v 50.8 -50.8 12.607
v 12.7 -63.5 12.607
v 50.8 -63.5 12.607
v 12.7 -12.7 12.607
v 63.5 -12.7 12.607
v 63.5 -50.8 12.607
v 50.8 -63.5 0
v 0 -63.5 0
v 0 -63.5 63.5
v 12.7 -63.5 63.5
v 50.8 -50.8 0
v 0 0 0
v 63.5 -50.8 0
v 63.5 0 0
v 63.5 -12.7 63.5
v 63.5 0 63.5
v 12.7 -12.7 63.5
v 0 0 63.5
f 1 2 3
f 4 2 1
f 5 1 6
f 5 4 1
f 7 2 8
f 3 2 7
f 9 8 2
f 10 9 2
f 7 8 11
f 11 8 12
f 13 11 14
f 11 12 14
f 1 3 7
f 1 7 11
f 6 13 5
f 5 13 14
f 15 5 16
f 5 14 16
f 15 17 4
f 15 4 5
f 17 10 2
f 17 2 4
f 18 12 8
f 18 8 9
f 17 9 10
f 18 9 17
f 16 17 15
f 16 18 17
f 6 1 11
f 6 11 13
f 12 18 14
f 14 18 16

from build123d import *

# Parameters (mm, degrees)
F0_W     = 63.5
F0_H     = 63.5
F1_DEPTH = 63.5
F2_W     = 50.8
F2_H     = 50.8
F3_DEPTH = 50.893329
F4_W     = 12.7
F4_H     = 12.7
F5_DEPTH = 25.4


with BuildPart() as f1:
    # F0 (on Front) → F1 (new body)
    with BuildSketch(Plane.XZ):
        with Locations((31.75, 31.75)):
            Rectangle(F0_W, F0_H)
    extrude(amount=F1_DEPTH)

    # F2 (on face) → F3 (cut)
    with BuildSketch(Plane.XY.offset(63.5)):
        with Locations((38.1, -38.1)):
            Rectangle(F2_W, F2_H)
    extrude(amount=-F3_DEPTH, mode=Mode.SUBTRACT)

    # F4 (on face) → F5 (cut)
    with BuildSketch(Plane.XY.offset(12.606671)):
        with Locations((57.15, -57.15)):
            Rectangle(F4_W, F4_H)
    extrude(amount=-F5_DEPTH, mode=Mode.SUBTRACT)


solid = f1.part
